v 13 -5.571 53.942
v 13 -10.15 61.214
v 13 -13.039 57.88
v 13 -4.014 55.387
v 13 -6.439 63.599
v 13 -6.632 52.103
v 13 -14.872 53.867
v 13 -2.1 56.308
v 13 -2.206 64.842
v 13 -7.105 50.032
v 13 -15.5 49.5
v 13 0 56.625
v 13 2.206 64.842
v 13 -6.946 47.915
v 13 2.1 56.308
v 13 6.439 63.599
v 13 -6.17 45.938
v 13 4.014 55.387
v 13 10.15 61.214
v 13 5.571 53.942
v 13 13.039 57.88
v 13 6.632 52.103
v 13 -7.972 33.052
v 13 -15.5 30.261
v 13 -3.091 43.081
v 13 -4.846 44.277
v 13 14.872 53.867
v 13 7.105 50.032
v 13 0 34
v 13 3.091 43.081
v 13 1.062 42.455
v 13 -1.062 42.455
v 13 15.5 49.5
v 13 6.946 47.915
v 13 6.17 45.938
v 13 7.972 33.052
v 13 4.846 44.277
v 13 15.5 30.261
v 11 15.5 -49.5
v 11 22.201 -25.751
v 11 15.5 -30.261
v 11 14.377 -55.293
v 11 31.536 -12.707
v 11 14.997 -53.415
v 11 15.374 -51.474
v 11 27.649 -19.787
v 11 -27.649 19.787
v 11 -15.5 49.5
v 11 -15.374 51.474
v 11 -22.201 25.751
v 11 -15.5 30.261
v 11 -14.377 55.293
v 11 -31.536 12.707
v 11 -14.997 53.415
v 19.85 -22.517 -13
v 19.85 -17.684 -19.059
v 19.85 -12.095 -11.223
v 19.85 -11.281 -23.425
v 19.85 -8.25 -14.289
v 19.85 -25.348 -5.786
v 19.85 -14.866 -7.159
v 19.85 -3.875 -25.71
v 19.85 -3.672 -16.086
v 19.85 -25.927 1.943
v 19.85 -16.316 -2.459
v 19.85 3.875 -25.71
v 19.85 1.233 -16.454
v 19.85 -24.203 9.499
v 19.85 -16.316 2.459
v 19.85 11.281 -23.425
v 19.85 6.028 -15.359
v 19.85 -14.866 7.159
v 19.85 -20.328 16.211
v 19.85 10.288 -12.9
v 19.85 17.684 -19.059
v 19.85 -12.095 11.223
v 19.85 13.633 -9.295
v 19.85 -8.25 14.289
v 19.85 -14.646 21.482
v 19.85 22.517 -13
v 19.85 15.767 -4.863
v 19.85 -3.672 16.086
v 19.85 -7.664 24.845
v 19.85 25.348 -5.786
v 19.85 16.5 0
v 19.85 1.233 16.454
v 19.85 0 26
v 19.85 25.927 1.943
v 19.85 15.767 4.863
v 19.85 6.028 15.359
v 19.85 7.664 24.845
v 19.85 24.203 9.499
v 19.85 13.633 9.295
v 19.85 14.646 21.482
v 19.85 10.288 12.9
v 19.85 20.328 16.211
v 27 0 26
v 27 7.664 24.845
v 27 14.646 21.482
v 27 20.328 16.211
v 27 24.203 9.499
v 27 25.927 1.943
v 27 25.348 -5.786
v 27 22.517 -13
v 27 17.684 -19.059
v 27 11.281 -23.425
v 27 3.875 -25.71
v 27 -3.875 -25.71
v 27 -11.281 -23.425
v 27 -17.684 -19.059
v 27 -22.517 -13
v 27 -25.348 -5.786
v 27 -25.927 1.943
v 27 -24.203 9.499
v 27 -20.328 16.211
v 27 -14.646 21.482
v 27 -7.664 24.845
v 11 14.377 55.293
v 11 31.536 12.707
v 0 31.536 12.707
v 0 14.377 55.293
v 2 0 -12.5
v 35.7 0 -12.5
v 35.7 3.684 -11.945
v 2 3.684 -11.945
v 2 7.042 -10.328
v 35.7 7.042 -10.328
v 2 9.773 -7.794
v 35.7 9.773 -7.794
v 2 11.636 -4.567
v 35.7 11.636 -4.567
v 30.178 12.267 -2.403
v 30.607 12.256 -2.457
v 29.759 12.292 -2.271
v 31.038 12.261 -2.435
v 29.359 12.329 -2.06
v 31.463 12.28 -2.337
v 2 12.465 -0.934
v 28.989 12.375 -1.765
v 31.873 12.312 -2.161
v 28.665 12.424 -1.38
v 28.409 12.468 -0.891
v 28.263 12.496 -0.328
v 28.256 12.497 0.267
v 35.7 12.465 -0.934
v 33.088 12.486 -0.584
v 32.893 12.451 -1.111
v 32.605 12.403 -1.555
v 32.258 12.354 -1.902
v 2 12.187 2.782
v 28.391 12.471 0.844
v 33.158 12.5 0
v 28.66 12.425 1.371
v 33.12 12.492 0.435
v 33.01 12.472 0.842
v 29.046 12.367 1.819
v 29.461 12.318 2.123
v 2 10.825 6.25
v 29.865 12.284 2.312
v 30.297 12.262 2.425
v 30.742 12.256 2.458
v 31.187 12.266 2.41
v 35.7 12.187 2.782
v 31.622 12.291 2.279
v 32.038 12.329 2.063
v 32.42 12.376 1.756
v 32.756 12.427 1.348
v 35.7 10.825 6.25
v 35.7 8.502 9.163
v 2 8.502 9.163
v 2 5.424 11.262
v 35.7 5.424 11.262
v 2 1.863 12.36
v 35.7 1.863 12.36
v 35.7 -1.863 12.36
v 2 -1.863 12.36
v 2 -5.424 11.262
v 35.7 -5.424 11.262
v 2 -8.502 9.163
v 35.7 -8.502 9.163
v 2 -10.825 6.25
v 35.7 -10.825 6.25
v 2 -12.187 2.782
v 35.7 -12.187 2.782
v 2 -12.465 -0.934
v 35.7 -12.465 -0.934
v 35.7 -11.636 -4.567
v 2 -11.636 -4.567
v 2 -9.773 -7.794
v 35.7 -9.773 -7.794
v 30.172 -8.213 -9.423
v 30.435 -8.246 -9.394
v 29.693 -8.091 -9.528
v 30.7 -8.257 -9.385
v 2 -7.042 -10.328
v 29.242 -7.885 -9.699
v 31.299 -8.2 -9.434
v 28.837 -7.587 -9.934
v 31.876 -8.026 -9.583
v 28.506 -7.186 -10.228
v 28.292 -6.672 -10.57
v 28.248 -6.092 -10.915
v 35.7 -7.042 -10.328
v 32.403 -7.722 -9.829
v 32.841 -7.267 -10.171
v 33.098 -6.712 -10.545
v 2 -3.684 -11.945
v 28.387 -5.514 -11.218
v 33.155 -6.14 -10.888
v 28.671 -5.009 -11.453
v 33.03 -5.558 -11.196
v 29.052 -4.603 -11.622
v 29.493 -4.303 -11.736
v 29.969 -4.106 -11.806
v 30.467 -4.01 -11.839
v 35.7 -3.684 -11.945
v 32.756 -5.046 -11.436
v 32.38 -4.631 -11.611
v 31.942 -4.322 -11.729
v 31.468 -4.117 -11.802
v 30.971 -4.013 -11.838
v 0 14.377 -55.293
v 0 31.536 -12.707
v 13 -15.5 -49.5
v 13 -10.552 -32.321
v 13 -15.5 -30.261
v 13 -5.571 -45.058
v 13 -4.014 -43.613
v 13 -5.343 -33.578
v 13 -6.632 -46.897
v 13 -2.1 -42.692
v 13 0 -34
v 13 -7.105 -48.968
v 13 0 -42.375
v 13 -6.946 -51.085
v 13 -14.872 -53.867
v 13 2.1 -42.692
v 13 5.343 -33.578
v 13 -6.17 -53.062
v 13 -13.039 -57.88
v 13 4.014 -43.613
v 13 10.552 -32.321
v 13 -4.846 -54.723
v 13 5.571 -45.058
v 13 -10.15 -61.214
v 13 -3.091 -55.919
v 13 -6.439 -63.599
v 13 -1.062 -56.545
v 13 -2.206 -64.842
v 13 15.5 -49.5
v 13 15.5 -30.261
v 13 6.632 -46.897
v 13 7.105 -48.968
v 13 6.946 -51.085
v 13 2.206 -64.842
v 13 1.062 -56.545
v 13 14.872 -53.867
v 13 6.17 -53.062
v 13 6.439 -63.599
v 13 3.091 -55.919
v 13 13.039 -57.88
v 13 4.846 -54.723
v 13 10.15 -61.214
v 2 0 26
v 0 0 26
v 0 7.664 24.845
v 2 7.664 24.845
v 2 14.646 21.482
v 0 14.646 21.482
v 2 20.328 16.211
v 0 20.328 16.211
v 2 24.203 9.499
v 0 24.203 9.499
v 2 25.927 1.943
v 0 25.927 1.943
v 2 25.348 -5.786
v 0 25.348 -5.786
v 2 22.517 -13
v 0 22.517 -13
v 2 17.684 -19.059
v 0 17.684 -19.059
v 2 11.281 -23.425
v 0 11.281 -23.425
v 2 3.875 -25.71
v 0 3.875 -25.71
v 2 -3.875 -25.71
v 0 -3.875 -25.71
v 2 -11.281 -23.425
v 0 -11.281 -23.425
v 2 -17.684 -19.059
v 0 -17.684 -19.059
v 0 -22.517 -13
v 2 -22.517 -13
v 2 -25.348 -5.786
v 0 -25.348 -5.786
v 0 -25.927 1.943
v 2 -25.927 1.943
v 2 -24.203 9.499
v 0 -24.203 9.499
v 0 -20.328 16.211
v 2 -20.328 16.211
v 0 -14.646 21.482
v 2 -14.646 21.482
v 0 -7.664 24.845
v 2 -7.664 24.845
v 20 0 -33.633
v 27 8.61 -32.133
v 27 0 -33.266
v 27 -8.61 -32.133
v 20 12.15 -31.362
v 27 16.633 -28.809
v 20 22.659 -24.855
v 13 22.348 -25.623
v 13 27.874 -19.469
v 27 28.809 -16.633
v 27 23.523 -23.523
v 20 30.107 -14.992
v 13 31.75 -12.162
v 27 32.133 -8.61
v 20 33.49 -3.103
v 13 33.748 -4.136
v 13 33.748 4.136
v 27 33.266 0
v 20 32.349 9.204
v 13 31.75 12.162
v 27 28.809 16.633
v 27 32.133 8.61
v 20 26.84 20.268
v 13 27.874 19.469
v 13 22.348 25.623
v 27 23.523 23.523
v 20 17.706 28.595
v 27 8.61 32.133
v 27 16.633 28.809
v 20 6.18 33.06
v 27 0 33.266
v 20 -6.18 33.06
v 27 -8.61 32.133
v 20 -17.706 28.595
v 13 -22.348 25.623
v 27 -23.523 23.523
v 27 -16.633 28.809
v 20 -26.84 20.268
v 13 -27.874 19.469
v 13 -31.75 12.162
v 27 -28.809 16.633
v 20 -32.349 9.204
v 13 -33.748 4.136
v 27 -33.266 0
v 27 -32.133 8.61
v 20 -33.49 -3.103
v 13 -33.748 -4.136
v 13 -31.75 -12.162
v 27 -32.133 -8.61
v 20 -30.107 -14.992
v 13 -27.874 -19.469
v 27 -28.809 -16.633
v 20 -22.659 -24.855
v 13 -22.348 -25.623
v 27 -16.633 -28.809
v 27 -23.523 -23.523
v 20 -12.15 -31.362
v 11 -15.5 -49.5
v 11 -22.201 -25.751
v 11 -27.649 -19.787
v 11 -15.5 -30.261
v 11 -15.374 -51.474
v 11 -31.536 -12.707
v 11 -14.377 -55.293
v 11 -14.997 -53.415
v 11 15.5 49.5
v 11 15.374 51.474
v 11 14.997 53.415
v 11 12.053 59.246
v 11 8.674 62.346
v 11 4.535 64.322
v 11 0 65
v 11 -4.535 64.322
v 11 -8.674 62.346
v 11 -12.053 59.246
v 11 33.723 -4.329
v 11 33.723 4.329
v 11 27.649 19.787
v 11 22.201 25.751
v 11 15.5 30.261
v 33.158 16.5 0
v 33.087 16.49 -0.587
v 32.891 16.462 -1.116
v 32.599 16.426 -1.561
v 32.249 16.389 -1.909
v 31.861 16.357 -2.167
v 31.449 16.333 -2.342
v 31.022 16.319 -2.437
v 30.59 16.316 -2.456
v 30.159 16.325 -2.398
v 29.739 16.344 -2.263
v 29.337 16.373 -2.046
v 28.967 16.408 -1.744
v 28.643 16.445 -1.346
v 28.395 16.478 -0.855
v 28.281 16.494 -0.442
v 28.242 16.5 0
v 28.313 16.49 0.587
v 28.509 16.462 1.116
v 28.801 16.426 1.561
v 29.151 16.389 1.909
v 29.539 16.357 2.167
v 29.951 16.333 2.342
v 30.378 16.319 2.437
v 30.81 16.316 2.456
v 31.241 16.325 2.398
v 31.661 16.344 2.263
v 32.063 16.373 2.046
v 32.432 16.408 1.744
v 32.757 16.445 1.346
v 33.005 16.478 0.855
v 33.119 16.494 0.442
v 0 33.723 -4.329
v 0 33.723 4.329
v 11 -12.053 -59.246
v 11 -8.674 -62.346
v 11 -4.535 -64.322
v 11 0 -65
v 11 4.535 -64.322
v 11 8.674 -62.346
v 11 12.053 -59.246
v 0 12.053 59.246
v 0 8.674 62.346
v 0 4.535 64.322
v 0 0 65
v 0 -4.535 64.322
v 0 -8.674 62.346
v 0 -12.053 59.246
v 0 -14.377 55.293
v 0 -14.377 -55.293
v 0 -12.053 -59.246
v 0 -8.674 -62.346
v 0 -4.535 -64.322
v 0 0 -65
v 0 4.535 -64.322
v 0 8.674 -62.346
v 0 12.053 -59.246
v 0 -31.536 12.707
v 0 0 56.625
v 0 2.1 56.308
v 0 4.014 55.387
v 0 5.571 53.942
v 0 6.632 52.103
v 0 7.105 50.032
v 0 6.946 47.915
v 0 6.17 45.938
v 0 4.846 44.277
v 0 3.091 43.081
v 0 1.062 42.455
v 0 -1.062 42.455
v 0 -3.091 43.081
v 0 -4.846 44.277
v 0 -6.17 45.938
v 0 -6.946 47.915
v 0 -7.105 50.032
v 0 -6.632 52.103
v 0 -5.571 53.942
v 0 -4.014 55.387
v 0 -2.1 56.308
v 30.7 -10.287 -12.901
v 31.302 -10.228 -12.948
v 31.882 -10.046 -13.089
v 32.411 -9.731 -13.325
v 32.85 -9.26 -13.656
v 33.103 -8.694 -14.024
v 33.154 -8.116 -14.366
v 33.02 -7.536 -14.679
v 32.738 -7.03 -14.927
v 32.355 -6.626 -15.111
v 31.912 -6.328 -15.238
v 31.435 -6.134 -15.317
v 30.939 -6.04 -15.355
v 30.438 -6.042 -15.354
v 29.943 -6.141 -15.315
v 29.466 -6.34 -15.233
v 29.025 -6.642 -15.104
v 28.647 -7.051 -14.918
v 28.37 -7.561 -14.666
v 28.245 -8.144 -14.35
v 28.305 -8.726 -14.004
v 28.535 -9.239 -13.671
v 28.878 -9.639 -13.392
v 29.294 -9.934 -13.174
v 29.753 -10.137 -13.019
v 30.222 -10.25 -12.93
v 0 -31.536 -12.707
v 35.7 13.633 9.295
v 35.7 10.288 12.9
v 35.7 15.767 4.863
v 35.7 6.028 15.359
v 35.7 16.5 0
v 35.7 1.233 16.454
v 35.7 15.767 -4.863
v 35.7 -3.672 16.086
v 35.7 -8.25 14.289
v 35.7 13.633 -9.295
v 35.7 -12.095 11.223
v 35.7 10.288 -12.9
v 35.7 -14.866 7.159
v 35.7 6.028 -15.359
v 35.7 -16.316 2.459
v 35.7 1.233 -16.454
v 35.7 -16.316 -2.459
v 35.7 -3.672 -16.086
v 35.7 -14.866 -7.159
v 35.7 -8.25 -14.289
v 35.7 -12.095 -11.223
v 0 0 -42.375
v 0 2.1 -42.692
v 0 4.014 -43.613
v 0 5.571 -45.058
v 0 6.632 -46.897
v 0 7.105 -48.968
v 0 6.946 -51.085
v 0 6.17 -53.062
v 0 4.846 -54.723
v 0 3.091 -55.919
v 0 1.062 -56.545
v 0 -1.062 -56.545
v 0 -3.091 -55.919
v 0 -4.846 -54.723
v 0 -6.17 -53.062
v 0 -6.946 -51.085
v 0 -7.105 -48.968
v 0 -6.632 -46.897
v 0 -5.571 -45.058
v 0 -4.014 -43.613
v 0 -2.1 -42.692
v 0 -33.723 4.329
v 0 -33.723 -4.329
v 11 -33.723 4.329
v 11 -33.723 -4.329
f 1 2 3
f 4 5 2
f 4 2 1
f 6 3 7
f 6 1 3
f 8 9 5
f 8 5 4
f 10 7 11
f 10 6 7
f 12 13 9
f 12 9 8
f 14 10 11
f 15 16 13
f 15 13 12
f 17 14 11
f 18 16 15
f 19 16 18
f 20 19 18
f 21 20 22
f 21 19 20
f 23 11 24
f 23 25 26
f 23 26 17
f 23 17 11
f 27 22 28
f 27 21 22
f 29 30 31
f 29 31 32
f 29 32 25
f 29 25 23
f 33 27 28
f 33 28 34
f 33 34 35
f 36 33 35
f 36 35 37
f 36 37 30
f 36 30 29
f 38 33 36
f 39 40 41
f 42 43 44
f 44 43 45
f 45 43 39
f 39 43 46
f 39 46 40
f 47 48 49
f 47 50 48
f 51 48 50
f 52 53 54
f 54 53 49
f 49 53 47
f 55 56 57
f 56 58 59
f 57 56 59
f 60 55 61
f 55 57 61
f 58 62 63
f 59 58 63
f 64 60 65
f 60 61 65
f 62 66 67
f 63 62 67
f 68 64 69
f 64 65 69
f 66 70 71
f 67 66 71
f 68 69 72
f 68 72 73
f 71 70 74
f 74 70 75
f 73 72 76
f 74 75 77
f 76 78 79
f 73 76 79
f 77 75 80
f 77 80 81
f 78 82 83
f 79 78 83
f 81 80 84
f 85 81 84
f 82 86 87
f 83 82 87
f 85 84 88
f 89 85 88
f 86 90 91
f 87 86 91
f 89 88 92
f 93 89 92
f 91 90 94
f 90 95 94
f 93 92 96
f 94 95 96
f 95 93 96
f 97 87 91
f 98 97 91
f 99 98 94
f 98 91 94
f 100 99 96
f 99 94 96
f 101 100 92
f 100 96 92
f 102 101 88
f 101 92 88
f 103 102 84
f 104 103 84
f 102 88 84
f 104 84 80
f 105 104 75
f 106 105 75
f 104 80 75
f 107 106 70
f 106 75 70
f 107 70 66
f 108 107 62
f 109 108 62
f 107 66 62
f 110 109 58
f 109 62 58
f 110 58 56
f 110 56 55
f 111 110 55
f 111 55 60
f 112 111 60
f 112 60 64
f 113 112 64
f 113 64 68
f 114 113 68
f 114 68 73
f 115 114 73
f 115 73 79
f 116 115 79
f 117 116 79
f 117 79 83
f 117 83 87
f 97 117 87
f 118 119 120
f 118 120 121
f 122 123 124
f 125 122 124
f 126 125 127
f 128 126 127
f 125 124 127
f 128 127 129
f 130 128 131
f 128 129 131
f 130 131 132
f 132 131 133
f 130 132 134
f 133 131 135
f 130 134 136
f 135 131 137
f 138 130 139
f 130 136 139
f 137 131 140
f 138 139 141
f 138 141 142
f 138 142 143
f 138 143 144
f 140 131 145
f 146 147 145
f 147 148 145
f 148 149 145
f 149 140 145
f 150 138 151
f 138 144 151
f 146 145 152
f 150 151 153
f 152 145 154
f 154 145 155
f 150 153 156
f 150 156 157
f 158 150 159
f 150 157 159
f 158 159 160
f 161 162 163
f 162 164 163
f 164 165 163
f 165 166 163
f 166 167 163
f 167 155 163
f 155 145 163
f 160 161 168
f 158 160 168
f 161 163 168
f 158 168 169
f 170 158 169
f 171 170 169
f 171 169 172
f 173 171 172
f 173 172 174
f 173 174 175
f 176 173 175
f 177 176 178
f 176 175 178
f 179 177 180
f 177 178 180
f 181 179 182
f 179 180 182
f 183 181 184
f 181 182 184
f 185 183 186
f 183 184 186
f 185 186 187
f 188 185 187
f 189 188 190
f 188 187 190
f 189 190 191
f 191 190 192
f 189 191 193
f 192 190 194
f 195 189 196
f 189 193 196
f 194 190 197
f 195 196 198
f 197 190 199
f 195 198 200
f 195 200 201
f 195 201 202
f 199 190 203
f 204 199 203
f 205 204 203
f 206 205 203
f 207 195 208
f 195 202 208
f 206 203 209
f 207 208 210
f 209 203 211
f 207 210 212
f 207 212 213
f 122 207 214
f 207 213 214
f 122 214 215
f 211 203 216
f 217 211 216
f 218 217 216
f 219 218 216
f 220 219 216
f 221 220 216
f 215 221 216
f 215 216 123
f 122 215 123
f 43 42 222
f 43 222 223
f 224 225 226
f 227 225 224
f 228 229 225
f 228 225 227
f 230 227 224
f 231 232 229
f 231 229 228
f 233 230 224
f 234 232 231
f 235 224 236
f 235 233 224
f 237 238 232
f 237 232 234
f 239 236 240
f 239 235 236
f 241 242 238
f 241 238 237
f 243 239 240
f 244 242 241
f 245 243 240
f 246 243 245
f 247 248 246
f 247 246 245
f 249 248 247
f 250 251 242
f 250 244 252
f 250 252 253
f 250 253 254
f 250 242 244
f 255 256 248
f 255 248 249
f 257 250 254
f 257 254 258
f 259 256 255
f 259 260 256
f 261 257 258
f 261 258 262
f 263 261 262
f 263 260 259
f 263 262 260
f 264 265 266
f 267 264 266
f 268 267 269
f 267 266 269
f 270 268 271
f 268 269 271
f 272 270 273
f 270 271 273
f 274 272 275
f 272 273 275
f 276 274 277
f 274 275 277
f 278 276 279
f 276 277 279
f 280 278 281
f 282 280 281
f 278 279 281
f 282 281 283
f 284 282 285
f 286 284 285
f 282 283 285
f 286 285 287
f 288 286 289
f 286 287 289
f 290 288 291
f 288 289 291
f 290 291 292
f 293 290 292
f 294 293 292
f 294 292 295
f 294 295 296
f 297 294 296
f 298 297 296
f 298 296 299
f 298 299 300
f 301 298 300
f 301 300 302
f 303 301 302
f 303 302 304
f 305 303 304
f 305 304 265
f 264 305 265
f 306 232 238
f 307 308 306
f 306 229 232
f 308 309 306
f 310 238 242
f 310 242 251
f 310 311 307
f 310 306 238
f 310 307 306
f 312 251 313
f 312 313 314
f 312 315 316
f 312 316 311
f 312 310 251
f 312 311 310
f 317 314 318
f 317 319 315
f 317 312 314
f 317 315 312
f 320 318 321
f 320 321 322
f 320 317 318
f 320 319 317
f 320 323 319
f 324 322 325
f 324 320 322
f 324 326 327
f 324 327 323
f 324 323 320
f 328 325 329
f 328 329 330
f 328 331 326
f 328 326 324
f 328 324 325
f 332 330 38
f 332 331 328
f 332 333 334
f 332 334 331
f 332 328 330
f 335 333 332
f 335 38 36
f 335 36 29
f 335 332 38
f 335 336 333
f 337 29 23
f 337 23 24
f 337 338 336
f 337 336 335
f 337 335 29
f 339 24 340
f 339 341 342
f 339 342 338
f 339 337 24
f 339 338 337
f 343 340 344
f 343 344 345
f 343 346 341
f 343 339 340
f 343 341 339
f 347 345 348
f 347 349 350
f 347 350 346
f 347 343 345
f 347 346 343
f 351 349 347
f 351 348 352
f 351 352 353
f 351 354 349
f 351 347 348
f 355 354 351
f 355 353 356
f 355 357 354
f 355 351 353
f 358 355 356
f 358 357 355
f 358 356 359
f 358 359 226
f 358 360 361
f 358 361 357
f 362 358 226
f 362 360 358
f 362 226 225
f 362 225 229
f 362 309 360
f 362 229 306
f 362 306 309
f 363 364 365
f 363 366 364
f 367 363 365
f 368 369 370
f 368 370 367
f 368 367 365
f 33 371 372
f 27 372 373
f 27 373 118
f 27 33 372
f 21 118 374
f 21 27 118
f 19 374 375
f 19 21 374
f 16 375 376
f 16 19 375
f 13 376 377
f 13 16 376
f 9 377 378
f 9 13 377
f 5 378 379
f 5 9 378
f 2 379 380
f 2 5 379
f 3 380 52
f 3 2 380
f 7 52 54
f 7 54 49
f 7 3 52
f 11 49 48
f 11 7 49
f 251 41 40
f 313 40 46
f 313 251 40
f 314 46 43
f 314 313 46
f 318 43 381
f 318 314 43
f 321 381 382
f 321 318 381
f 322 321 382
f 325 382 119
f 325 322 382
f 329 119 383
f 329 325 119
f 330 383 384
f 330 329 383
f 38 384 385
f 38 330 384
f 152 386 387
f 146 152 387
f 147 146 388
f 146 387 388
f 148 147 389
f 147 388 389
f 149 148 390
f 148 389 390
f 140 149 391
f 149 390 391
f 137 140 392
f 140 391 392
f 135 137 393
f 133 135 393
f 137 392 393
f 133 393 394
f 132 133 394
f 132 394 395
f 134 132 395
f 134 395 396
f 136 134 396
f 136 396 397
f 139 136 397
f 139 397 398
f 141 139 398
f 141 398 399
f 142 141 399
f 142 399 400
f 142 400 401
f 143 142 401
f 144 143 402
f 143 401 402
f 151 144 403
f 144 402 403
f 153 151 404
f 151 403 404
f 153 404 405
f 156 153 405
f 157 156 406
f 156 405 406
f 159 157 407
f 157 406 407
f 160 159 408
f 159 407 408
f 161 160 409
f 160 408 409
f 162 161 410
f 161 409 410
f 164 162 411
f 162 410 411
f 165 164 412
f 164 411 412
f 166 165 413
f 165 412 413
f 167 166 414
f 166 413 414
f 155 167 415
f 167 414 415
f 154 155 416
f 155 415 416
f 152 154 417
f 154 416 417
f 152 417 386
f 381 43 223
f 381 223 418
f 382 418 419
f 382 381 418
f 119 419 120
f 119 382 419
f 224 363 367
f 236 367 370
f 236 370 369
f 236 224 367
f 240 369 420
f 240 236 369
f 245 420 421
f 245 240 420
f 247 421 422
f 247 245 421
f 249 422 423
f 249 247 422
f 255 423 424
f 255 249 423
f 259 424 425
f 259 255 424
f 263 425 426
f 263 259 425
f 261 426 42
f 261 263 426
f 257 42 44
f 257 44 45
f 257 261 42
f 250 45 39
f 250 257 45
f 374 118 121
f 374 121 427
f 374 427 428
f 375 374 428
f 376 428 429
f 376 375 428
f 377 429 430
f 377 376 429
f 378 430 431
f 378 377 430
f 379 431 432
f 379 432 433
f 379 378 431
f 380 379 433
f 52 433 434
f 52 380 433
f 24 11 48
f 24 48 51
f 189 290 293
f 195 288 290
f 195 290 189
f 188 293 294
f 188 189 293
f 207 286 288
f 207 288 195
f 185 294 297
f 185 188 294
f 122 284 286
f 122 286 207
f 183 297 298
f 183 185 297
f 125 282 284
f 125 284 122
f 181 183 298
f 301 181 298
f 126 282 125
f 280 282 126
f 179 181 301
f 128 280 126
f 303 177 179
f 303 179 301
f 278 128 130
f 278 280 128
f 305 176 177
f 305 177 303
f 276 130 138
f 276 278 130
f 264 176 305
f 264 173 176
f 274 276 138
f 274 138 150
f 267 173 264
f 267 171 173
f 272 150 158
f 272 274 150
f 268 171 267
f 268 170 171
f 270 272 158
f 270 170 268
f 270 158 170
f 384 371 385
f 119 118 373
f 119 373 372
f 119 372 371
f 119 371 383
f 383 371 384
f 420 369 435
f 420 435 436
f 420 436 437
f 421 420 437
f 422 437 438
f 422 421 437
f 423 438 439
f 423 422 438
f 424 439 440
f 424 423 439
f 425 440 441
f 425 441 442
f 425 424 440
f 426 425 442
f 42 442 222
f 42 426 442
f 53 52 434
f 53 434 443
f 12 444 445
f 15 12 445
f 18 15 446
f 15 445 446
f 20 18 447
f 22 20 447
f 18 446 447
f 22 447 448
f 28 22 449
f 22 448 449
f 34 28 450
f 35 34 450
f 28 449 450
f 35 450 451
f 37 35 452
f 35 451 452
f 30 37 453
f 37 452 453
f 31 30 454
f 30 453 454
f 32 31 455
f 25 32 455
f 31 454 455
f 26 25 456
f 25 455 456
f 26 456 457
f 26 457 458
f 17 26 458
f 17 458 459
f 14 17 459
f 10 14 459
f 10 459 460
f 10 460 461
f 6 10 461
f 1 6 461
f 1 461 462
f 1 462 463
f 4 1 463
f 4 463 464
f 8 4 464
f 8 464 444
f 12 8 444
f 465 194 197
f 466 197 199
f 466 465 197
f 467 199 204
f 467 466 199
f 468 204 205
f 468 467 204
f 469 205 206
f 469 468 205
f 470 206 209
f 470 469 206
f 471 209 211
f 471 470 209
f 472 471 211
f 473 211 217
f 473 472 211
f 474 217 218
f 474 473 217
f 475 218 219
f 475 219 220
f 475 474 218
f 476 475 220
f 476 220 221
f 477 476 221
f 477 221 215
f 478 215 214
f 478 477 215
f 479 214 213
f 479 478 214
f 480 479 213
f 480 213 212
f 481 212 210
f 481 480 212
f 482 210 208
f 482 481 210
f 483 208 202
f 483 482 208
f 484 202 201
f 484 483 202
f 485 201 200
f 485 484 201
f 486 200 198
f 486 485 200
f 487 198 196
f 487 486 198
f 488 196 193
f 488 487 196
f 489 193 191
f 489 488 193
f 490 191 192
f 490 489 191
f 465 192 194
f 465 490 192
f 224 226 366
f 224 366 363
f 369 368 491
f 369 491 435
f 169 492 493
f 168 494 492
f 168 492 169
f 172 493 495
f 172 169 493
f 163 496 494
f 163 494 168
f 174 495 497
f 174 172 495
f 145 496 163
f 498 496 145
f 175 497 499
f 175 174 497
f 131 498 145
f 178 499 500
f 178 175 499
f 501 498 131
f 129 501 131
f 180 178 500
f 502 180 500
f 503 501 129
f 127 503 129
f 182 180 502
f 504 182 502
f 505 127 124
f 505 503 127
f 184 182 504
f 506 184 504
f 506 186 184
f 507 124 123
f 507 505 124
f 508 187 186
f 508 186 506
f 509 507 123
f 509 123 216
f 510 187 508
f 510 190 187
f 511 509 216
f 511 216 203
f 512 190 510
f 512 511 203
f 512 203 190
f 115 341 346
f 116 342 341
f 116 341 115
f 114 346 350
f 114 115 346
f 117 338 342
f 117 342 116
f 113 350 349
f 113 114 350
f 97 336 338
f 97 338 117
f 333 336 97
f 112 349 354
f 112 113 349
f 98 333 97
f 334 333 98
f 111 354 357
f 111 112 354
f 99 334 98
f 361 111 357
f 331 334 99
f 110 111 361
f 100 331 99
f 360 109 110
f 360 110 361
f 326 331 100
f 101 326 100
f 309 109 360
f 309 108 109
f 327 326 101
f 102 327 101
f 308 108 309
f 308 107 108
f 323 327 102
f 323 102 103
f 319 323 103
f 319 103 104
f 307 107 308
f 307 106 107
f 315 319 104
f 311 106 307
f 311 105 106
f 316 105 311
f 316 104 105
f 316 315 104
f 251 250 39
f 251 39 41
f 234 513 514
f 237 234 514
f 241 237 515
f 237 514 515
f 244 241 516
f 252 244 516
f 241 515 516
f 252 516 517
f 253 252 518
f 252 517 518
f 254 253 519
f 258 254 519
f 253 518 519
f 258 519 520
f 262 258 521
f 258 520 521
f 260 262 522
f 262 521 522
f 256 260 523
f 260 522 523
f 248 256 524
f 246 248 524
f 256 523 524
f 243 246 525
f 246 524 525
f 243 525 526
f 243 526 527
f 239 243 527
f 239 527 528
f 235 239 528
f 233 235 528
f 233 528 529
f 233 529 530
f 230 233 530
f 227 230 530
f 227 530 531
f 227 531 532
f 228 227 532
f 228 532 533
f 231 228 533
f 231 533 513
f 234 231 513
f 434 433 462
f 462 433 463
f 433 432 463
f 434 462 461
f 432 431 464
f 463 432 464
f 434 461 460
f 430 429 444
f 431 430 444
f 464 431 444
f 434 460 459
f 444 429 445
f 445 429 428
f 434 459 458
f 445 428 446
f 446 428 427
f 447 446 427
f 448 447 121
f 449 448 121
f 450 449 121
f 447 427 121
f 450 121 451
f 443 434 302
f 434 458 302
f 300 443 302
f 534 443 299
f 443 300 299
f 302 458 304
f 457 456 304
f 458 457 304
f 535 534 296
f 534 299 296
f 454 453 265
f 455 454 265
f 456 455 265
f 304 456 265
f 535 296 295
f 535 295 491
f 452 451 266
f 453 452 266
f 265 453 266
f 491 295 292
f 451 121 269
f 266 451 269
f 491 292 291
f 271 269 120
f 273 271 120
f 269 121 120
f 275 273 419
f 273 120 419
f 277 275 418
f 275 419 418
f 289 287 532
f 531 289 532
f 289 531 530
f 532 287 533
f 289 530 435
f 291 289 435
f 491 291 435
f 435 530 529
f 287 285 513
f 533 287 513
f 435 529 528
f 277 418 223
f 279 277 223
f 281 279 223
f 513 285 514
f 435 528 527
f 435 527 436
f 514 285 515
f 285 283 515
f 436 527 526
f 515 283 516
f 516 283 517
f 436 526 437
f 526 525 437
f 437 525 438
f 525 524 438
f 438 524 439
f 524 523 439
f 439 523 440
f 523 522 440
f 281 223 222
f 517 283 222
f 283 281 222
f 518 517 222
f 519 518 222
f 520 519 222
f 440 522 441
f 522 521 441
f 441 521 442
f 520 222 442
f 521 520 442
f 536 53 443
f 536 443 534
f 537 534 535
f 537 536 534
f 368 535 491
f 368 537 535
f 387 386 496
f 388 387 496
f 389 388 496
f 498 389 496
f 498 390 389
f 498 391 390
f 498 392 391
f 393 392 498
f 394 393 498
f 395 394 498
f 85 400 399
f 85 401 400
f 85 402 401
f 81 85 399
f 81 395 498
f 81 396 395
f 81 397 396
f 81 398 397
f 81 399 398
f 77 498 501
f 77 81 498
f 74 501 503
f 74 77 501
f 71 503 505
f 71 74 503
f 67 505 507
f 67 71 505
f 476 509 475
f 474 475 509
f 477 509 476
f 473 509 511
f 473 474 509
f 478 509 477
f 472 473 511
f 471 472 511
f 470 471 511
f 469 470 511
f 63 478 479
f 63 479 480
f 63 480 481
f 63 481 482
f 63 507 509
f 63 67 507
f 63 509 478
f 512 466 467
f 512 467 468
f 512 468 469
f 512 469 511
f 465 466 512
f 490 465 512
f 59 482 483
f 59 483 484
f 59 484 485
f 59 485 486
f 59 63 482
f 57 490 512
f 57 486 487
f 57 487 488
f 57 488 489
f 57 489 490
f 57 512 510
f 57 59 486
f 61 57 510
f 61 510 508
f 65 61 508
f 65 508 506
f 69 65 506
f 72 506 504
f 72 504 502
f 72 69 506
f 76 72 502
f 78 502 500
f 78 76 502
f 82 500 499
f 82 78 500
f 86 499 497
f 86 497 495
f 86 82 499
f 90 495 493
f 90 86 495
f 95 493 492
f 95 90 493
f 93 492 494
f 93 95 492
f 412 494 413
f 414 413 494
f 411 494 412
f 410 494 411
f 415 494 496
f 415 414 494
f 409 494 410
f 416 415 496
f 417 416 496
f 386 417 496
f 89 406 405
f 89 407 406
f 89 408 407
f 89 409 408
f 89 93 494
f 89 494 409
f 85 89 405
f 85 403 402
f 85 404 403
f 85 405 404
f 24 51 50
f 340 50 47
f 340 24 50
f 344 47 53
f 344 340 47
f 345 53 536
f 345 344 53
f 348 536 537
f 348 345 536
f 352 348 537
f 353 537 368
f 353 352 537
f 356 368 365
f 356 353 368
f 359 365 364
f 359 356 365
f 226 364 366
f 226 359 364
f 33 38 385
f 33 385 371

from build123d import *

# Parameters (mm, degrees)
EXTRUDE_1_DEPTH               = 2
EXTRUDE_2_DEPTH               = 11
SKETCH_3_R                    = 34
EXTRUDE_3_DEPTH               = 14
EXTRUDE_3_TAPER               = 3
HOLE_WIZARD_M45_1_D           = 52
HOLE_WIZARD_M45_1_DEPTH       = 7.15
SKETCH_6_W                    = 15.85
SKETCH_6_H                    = 16.5
HOLE_WIZARD_14_25_14_25_1_D   = 14.25
HOLE_WIZARD_M24_1_D           = 25
HOLE_WIZARD_M24_1_DEPTH       = 35.7
HOLE_WIZARD_M24_1_CBORE_D     = 52
HOLE_WIZARD_M24_1_CBORE_DEPTH = 2
SKETCH_11_W                   = 2.4585
SKETCH_11_H                   = 61.03580457
HOLE_WIZARD_2_D               = 4.917
HOLE_WIZARD_2_DEPTH           = 21.744153324


with BuildPart() as part:
    # 草图1 → 凸台-拉伸1 (new body)
    with BuildSketch(Plane(origin=(13, 0, 0), x_dir=(0, 0, -1), z_dir=(1, 0, 0))):
        with BuildLine():
            Line((49.5, 15.5), (30.261361503, 15.5))
            ThreePointArc((30.261361503, 15.5), (0, 34), (-30.261361503, 15.5))
            Line((-30.261361503, 15.5), (-49.5, 15.5))
            ThreePointArc((-49.5, 15.5), (-65, 0), (-49.5, -15.5))
            Line((-49.5, -15.5), (-30.261361503, -15.5))
            ThreePointArc((-30.261361503, -15.5), (0, -34), (30.261361503, -15.5))
            Line((30.261361503, -15.5), (49.5, -15.5))
            ThreePointArc((49.5, -15.5), (65, 0), (49.5, 15.5))
        make_face()
    extrude(amount=-EXTRUDE_1_DEPTH)

    # 草图2 → 凸台-拉伸2 (add)
    with BuildSketch(Plane.ZY.offset(-11)):
        with BuildLine():
            Line((12.707070707, 31.536175324), (55.292929293, 14.376785809))
            ThreePointArc((55.292929293, 14.376785809), (65, 0), (55.292929293, -14.376785809))
            Line((55.292929293, -14.376785809), (12.707070707, -31.536175324))
            ThreePointArc((12.707070707, -31.536175324), (0, -34), (-12.707070707, -31.536175324))
            Line((-12.707070707, -31.536175324), (-55.292929293, -14.376785809))
            ThreePointArc((-55.292929293, -14.376785809), (-65, 0), (-55.292929293, 14.376785809))
            Line((-55.292929293, 14.376785809), (-12.707070707, 31.536175324))
            ThreePointArc((-12.707070707, 31.536175324), (0, 34), (12.707070707, 31.536175324))
        make_face()
    extrude(amount=EXTRUDE_2_DEPTH)

    # 草图3 → 凸台-拉伸3 (add)
    with BuildSketch(Plane(origin=(13, 0, 0), x_dir=(0, 0, -1), z_dir=(1, 0, 0))):
        Circle(SKETCH_3_R)
    extrude(amount=EXTRUDE_3_DEPTH, taper=EXTRUDE_3_TAPER)

    # M45 间隙孔1
    with Locations(Plane(origin=(27, 0, 0), x_dir=(0, 0, -1), z_dir=(1, 0, 0))):
        with Locations((0, 0)):
            Hole(HOLE_WIZARD_M45_1_D / 2, depth=HOLE_WIZARD_M45_1_DEPTH)

    # 草图6 → 旋转1 (revolve)
    with BuildSketch(Plane(origin=(0, 0, 0), x_dir=(-1, 0, 0), z_dir=(0, 0, -1))):
        with Locations((-27.775, 8.25)):
            Rectangle(SKETCH_6_W, SKETCH_6_H)
    revolve(axis=Axis((35.7, 0, 0), (-1, 0, 0)))

    # Ø14.25 (14.25) 直径孔1 (through all)
    with Locations(Plane(origin=(13, 0, 0), x_dir=(0, 0, -1), z_dir=(1, 0, 0))):
        with Locations((-49.5, 0), (49.5, 0)):
            Hole(HOLE_WIZARD_14_25_14_25_1_D / 2)

    # M24 六角头螺栓的柱形沉头孔1
    with Locations(Plane.ZY):
        with Locations((0, 0)):
            CounterBoreHole(HOLE_WIZARD_M24_1_D / 2, HOLE_WIZARD_M24_1_CBORE_D / 2, HOLE_WIZARD_M24_1_CBORE_DEPTH, depth=HOLE_WIZARD_M24_1_DEPTH)

    # 草图11 → 孔1 (revolve, cut)
    with BuildSketch(Plane(origin=(30.7, -6.127923338, -10.613874566), x_dir=(0, -0.866025404, 0.5), z_dir=(1, 0, 0))):
        with Locations((1.22925, 30.517902285)):
            Rectangle(SKETCH_11_W, SKETCH_11_H)
    revolve(axis=Axis((30.7, -61.127923338, -105.876668983), (0, 0.5, 0.866025404)), mode=Mode.SUBTRACT)

    # 孔2
    with Locations(Plane(origin=(0, 12.255846676, 0), x_dir=(-1, 0, 0), z_dir=(0, -1, 0))):
        with Locations((-30.7, 0)):
            Hole(HOLE_WIZARD_2_D / 2, depth=HOLE_WIZARD_2_DEPTH)


solid = part.part
